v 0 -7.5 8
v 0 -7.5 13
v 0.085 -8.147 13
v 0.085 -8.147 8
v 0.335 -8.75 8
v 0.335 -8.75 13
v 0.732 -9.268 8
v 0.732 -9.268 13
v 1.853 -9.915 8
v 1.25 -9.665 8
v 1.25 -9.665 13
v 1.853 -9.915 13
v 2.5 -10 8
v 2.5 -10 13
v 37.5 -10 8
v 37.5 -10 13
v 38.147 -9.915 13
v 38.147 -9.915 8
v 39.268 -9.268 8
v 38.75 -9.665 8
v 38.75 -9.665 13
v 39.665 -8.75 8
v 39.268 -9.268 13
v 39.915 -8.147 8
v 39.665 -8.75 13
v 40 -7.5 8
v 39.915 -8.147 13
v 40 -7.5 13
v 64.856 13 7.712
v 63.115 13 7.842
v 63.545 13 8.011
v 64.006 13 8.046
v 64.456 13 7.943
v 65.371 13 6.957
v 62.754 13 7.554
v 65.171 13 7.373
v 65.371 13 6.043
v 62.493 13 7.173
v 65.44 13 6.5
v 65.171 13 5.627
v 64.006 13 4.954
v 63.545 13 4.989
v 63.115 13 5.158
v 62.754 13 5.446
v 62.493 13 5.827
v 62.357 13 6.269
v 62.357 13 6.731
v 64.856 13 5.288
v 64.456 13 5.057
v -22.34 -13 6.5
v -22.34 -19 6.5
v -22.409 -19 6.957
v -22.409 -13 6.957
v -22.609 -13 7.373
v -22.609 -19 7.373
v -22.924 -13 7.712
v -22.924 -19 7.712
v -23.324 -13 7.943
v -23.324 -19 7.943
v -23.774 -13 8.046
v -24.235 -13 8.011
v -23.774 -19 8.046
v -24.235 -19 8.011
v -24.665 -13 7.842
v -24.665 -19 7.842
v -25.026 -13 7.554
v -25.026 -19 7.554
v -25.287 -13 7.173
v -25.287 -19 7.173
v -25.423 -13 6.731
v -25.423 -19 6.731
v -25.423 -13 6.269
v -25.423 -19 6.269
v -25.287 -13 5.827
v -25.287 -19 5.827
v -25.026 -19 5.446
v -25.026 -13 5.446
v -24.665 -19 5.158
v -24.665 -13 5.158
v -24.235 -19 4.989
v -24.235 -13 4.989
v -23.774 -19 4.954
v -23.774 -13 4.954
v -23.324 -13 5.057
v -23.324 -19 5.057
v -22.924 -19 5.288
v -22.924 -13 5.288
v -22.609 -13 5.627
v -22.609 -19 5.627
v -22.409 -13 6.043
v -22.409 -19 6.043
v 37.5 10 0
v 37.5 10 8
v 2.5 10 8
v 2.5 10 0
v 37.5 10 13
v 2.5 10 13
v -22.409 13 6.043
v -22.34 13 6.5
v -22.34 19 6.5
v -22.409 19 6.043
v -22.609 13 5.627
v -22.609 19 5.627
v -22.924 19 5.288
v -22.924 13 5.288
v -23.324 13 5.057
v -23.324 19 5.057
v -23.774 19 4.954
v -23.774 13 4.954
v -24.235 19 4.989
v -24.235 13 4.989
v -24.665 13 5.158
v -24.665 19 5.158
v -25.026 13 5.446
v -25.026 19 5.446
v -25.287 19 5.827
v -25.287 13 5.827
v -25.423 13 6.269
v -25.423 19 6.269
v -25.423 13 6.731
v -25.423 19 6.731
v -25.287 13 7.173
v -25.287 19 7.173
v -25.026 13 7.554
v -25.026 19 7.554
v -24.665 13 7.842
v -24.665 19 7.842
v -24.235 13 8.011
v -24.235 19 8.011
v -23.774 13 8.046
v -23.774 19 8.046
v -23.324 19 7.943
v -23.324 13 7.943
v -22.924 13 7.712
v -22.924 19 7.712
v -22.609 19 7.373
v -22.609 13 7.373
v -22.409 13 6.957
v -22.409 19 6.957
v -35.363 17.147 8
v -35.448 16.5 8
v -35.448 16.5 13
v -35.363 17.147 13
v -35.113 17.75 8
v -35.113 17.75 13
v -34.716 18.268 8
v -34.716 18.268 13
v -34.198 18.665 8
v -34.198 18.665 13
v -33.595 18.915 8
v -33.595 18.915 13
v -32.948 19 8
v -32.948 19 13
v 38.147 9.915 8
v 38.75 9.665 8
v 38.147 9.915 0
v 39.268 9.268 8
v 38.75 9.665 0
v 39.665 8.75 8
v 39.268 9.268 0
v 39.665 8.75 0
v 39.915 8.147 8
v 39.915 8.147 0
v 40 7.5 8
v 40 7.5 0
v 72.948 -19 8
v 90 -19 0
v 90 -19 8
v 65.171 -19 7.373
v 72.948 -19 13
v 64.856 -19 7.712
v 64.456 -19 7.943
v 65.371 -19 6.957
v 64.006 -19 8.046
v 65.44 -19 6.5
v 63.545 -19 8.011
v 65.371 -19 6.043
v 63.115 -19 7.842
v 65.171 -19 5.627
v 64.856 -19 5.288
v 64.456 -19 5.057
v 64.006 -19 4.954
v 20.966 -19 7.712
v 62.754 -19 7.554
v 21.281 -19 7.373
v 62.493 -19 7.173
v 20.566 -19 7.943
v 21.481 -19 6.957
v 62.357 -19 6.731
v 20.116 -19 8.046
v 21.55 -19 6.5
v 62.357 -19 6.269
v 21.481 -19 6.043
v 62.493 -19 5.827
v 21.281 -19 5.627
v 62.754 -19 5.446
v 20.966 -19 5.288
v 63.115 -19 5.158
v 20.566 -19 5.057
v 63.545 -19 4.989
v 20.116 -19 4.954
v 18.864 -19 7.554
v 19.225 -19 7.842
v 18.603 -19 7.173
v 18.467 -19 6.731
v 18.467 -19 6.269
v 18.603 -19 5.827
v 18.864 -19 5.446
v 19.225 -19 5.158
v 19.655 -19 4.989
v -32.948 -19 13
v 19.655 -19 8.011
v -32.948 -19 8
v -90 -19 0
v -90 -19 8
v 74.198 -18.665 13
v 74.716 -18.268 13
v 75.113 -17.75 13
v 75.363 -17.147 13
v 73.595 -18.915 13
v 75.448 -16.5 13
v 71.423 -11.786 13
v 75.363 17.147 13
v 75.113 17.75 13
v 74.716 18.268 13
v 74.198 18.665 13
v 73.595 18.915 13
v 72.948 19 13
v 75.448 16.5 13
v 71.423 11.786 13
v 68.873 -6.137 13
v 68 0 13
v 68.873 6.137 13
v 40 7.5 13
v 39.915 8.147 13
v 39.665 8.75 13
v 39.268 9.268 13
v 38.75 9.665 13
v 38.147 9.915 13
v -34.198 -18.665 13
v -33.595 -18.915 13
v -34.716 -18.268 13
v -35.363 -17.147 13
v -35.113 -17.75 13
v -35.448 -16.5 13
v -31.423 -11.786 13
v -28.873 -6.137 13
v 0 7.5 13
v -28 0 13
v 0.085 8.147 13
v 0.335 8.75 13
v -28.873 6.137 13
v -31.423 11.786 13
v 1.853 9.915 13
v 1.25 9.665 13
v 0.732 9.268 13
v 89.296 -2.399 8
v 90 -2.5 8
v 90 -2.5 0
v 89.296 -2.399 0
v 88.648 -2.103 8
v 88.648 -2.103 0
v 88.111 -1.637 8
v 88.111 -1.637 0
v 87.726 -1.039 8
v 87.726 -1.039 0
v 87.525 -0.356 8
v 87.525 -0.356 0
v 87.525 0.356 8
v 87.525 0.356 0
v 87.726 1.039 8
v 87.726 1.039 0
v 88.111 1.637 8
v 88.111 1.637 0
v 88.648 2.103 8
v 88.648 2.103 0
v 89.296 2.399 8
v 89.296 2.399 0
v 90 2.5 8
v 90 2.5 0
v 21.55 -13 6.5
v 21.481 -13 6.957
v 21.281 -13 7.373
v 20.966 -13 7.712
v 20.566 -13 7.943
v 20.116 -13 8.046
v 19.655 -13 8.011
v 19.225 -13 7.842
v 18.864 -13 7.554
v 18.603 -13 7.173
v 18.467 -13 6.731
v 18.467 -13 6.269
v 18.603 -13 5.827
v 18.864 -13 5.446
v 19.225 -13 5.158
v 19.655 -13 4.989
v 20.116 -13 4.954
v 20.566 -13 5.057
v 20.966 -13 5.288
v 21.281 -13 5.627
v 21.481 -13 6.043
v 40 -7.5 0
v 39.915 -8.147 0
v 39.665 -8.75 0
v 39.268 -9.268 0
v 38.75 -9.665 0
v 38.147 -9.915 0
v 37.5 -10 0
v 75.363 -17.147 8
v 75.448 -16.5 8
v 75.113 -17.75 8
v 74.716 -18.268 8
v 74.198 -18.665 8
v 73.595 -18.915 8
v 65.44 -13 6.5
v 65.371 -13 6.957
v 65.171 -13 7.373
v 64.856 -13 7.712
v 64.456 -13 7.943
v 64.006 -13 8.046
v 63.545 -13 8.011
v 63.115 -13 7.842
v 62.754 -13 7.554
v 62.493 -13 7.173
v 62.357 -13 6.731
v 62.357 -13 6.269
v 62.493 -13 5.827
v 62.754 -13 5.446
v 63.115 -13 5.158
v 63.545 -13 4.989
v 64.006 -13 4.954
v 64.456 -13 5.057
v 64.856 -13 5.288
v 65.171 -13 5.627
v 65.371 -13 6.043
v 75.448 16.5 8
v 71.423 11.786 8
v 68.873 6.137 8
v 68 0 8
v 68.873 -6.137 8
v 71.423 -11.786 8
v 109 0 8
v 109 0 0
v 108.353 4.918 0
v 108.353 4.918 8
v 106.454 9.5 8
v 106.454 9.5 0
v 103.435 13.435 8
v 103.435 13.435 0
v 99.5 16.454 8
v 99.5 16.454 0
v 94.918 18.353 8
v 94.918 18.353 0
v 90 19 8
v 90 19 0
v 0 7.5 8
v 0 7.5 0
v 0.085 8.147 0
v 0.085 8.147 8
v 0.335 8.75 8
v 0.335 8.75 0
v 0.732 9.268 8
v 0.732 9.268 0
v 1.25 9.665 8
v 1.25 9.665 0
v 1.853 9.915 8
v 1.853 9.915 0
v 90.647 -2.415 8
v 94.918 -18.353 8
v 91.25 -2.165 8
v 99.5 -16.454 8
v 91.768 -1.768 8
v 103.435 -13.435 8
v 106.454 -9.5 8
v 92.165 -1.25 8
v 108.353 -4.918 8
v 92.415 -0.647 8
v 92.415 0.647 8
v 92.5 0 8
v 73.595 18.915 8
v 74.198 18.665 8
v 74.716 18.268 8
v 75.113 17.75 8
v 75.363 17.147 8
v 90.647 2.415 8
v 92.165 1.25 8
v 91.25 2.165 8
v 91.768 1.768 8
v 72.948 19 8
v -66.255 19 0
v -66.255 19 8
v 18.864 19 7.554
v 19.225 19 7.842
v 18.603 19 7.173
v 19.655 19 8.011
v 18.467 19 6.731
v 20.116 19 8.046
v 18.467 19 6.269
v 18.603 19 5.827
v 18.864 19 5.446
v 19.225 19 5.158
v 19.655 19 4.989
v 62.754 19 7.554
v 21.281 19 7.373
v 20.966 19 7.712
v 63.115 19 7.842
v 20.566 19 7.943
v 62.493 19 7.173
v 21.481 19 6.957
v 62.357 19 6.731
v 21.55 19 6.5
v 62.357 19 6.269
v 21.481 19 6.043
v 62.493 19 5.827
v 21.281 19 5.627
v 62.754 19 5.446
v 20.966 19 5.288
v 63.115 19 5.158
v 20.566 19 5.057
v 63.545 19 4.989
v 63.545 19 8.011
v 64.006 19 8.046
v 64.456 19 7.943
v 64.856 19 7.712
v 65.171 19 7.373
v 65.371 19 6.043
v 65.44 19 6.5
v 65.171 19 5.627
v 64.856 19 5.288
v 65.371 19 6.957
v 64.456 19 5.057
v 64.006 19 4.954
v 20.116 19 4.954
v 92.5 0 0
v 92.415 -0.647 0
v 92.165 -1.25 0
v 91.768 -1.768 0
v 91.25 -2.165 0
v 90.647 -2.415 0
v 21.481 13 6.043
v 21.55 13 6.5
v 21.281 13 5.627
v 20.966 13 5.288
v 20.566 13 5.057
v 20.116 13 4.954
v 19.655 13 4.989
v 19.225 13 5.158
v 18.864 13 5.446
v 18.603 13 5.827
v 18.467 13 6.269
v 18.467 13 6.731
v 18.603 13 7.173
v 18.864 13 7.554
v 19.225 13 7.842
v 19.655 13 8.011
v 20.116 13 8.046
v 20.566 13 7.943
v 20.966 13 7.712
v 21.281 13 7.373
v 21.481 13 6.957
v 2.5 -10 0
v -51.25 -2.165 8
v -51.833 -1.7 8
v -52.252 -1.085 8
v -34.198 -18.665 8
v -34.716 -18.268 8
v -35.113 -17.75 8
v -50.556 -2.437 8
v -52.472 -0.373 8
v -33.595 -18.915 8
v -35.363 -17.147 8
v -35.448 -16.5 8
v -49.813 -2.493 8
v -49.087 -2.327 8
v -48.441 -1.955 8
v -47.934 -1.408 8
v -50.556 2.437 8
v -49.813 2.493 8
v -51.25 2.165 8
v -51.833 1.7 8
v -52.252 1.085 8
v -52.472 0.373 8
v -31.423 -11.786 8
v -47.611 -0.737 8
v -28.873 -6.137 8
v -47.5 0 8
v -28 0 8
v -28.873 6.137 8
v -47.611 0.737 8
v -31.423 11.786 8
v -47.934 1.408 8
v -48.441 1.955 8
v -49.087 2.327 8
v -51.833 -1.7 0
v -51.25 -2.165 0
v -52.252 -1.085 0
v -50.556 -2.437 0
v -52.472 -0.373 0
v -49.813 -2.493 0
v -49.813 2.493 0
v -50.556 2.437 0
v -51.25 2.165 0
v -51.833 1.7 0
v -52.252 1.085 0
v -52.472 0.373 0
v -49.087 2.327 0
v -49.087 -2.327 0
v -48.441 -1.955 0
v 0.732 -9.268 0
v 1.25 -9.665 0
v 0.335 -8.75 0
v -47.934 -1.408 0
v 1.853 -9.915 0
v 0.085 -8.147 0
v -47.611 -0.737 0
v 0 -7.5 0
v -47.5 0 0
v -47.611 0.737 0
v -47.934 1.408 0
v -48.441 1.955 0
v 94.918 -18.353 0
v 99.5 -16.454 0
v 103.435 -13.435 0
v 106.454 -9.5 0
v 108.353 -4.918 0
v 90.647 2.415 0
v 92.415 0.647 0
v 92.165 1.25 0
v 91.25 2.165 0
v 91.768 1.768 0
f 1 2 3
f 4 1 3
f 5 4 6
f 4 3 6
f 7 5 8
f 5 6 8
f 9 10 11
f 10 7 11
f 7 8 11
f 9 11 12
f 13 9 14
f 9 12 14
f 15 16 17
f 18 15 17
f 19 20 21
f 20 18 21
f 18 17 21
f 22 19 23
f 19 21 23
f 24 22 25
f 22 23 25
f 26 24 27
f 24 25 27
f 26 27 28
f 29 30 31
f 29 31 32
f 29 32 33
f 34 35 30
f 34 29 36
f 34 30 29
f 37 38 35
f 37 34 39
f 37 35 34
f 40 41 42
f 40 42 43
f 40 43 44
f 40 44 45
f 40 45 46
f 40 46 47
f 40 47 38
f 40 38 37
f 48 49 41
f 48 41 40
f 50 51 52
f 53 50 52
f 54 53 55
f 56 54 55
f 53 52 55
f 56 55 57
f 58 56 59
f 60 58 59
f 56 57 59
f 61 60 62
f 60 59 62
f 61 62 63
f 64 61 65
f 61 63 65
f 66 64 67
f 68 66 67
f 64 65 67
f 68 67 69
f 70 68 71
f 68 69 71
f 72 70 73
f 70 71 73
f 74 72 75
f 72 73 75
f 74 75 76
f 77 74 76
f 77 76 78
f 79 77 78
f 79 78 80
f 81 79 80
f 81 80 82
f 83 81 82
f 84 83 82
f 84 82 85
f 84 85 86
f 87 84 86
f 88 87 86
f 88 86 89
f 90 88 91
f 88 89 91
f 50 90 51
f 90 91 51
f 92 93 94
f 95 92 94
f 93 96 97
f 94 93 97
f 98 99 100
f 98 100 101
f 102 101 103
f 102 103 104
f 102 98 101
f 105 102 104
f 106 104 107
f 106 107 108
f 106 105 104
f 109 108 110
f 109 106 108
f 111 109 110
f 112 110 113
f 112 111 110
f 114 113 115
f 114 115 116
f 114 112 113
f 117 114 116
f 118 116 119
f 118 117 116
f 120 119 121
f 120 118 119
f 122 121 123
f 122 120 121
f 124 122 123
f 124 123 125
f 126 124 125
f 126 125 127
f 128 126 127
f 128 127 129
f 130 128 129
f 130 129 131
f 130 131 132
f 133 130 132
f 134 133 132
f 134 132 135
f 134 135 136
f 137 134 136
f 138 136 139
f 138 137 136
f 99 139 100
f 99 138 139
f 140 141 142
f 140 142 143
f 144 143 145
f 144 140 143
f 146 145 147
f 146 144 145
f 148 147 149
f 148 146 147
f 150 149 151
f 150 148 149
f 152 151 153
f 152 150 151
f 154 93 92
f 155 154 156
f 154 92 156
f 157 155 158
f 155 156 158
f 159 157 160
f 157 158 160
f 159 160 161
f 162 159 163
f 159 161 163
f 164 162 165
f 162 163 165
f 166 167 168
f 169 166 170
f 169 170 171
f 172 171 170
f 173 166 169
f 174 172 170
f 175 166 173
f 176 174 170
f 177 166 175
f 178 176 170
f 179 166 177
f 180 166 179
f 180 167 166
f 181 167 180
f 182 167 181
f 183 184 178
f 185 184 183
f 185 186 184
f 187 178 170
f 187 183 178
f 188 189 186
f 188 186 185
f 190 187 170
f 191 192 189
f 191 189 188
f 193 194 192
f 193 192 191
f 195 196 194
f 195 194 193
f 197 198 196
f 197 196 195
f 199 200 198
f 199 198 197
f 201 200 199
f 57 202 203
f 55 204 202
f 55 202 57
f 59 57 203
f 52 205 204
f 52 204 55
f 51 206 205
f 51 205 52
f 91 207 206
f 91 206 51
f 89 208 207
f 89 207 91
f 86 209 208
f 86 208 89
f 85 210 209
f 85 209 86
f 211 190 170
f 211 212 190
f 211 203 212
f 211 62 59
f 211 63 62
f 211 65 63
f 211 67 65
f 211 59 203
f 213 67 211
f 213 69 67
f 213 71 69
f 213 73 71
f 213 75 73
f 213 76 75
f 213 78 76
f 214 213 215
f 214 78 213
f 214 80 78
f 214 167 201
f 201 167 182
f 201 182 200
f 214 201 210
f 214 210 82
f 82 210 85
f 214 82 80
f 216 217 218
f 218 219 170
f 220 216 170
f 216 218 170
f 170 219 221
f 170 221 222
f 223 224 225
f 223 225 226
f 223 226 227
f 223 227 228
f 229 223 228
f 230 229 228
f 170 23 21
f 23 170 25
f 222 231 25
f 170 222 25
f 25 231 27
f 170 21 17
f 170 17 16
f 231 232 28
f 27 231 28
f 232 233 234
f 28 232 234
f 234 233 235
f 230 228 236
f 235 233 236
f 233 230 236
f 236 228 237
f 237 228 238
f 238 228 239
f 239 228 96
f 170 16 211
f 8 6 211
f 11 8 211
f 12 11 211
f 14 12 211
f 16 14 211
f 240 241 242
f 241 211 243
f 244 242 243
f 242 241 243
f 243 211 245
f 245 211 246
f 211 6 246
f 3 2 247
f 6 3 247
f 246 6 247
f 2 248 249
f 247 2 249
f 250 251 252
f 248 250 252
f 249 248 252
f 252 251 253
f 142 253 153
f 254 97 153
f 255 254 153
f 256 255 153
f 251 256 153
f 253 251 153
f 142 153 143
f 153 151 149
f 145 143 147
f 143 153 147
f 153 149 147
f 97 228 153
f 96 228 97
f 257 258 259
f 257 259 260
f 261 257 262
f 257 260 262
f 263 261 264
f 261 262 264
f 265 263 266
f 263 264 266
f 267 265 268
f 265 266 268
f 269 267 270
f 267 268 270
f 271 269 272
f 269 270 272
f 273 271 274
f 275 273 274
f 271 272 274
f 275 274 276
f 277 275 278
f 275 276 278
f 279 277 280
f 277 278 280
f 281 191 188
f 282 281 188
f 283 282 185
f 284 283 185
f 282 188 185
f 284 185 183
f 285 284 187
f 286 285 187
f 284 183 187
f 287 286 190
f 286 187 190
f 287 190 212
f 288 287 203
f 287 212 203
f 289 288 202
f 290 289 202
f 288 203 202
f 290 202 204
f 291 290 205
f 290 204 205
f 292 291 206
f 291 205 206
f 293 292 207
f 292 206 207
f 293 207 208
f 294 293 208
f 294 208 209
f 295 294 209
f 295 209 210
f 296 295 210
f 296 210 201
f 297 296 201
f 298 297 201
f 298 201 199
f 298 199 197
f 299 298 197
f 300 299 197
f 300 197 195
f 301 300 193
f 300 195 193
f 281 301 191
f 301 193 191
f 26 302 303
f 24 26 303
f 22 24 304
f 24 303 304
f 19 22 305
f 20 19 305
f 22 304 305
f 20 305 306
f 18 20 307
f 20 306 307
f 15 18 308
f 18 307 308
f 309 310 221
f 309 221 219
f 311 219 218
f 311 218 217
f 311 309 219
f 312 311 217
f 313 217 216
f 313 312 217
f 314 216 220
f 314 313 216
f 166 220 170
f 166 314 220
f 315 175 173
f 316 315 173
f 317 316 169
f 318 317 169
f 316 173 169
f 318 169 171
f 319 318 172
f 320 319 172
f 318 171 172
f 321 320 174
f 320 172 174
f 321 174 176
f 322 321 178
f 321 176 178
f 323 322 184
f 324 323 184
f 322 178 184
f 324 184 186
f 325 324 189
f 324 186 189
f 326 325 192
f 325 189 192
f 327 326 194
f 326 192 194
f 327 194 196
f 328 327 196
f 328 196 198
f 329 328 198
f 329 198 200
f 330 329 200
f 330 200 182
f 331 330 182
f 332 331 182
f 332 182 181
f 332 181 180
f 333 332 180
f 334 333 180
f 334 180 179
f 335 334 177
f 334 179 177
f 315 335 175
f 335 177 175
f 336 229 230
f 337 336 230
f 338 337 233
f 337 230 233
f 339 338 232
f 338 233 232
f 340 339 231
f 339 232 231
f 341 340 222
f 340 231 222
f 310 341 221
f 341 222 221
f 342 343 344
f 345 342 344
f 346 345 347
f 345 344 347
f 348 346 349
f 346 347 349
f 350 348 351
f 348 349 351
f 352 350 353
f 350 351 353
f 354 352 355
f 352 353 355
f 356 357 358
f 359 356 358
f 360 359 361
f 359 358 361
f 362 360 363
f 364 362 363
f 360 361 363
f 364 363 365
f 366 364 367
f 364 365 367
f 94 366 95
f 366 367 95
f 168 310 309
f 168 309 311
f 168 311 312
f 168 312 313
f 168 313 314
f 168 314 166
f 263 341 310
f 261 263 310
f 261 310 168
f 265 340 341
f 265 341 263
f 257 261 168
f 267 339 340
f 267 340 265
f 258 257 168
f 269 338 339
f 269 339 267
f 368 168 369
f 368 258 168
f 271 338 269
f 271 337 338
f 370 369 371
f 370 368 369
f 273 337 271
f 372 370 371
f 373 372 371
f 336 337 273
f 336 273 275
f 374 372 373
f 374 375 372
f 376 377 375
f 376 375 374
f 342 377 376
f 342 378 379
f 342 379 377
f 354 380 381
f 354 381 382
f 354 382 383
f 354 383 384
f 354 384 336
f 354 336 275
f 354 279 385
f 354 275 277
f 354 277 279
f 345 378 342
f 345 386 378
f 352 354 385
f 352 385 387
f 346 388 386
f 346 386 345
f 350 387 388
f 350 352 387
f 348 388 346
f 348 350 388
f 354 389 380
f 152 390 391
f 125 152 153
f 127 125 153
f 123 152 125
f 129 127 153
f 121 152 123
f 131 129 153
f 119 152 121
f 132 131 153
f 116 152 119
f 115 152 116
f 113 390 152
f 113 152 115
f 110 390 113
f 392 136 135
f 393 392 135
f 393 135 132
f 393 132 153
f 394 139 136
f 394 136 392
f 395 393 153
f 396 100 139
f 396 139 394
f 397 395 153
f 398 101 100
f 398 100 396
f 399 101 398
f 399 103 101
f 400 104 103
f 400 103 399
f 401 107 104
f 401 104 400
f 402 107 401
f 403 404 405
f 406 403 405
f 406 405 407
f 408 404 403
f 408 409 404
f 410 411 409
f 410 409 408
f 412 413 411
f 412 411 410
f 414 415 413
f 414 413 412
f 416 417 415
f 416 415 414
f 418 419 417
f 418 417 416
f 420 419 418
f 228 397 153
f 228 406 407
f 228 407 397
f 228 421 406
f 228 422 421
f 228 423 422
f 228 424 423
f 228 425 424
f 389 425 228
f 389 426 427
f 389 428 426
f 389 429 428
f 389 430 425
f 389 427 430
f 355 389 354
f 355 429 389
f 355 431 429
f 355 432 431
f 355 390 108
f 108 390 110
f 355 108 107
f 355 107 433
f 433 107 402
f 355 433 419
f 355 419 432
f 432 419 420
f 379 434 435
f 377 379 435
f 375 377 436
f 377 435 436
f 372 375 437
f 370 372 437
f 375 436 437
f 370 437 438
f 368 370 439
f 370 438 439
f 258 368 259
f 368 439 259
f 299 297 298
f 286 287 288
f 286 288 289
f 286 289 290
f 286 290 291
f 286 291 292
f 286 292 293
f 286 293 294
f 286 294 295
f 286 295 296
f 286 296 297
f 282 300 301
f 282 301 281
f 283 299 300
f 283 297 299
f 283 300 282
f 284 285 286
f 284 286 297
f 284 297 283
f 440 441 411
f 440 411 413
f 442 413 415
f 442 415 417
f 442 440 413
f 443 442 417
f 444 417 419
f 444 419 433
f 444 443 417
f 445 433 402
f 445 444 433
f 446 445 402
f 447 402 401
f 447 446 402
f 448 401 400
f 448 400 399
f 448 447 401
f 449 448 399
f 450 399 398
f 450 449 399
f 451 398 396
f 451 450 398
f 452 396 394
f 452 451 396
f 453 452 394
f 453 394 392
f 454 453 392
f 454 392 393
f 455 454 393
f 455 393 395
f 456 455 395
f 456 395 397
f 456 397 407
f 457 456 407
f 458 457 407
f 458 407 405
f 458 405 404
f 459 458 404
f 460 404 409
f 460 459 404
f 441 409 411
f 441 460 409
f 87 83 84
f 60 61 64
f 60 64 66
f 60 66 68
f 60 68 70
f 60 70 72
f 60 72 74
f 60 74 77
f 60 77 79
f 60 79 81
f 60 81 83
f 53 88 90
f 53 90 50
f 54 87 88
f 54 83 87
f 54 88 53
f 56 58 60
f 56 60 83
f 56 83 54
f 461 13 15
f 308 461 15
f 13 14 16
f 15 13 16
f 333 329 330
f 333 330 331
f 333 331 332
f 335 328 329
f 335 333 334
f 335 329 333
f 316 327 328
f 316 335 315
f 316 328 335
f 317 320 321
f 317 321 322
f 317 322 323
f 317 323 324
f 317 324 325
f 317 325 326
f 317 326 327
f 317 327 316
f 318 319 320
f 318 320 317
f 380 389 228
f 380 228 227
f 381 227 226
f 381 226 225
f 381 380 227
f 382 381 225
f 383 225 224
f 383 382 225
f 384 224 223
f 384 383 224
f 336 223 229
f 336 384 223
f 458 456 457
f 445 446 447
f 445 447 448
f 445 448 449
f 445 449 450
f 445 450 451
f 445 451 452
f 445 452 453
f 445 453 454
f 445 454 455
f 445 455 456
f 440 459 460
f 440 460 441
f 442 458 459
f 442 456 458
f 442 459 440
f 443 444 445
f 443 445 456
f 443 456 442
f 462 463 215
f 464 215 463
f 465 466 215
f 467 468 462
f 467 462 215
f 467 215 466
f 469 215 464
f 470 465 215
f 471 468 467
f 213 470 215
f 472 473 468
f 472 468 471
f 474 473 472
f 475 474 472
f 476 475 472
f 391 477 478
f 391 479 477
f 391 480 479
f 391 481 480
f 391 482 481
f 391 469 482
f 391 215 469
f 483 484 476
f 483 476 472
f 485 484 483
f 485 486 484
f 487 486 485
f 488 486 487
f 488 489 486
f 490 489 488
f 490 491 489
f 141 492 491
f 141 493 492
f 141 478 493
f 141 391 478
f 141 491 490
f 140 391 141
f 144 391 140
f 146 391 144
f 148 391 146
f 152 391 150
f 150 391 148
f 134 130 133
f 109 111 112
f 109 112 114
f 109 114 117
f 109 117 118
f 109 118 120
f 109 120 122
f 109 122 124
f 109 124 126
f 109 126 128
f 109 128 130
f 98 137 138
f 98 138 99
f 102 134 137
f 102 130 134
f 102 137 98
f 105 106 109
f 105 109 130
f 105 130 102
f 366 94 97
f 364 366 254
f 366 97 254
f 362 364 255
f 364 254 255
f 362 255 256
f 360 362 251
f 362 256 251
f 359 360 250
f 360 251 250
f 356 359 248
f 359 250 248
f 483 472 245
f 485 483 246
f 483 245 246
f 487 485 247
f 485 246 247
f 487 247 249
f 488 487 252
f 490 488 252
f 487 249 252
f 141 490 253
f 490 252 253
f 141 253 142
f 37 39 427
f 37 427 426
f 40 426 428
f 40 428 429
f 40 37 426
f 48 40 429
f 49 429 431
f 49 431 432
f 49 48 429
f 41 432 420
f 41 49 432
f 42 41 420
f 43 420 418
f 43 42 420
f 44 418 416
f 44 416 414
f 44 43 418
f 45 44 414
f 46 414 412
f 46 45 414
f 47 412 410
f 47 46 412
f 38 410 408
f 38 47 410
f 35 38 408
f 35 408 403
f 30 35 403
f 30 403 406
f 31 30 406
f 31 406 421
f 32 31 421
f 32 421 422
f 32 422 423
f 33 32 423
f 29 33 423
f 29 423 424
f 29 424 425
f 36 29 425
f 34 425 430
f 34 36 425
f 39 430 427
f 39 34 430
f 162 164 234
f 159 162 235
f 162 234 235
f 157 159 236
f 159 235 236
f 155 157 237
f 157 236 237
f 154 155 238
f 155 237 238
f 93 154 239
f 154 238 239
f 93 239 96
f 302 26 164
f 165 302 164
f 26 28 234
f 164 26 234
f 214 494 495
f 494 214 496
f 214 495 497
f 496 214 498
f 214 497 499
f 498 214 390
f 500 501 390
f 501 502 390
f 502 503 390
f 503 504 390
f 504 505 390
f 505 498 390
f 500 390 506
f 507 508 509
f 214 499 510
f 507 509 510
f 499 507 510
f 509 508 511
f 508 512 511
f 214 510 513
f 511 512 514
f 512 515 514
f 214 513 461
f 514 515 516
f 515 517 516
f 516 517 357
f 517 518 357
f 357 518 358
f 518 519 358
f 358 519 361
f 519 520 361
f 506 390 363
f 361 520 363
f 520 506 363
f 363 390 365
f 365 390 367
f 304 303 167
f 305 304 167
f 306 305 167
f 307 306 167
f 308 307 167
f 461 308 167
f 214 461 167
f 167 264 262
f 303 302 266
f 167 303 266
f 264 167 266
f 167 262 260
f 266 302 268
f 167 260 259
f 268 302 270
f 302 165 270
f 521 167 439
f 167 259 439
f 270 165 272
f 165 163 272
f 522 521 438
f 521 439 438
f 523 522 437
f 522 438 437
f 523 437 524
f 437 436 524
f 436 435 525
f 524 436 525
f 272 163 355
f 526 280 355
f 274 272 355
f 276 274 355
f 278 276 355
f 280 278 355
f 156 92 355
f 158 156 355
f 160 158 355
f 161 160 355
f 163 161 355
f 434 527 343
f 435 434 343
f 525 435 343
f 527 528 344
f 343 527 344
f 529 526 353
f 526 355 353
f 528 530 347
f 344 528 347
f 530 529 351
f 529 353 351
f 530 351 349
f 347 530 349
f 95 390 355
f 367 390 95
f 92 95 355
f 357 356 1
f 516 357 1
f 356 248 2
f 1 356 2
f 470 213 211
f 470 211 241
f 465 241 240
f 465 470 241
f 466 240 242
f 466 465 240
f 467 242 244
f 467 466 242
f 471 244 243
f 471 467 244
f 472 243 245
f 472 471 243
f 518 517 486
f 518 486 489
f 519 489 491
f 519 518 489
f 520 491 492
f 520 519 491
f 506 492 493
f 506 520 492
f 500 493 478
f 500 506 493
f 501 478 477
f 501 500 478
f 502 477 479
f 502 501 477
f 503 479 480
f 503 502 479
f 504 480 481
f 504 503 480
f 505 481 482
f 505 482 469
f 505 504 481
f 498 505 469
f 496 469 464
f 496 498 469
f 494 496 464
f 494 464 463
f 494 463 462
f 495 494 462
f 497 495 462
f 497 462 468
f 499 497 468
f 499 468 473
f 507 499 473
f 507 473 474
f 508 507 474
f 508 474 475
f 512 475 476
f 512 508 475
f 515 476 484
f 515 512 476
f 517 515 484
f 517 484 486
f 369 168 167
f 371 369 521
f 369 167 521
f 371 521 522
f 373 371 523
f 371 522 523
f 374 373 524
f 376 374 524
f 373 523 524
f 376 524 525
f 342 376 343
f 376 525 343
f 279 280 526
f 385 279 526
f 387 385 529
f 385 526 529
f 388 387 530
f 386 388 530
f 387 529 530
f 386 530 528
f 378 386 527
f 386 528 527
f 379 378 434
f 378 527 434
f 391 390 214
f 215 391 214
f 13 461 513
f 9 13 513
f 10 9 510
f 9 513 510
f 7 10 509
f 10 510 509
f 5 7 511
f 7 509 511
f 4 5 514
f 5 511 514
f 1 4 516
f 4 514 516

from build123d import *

# Parameters (mm, degrees)
SKETCH1_R           = 2.5
BOSS_EXTRUDE3_DEPTH = 8
BOSS_EXTRUDE7_DEPTH = 5
CUT_EXTRUDE1_DEPTH  = 112.404667766
SKETCH18_R          = 1.55
CUT_EXTRUDE2_DEPTH  = 6
CUT_EXTRUDE3_START  = -6
SKETCH19_R          = 1.55
CUT_EXTRUDE3_DEPTH  = 6
SKETCH21_R          = 22
CUT_EXTRUDE5_DEPTH  = 5


with BuildPart() as part:
    # Sketch1 → Boss-Extrude3 (new body)
    # profile 1 of 5: a face of its own
    with BuildSketch(Plane.XY):
        with BuildLine():
            Line((-66.254964627, 19), (-90, -19))
            Line((-90, -19), (90, -19))
            ThreePointArc((90, -19), (71, 0), (90, 19))
            Line((90, 19), (-66.254964627, 19))
        make_face()
        with Locations((-50, 0)):
            Circle(SKETCH1_R, mode=Mode.SUBTRACT)
        with BuildLine():
            ThreePointArc((40, -7.5), (39.267766953, -9.267766953), (37.5, -10))
            Line((37.5, -10), (2.5, -10))
            ThreePointArc((2.5, -10), (0.732233047, -9.267766953), (0, -7.5))
            Line((0, -7.5), (0, 7.5))
            ThreePointArc((0, 7.5), (0.732233047, 9.267766953), (2.5, 10))
            Line((2.5, 10), (37.5, 10))
            ThreePointArc((37.5, 10), (39.267766953, 9.267766953), (40, 7.5))
            Line((40, 7.5), (40, -7.5))
        make_face(mode=Mode.SUBTRACT)
    # profile 2 of 5: a face of its own
    with BuildSketch(Plane.XY):
        with BuildLine():
            ThreePointArc((90, 19), (71, 0), (90, -19))
            Line((90, -19), (90, -2.5))
            ThreePointArc((90, -2.5), (87.5, 0), (90, 2.5))
            Line((90, 2.5), (90, 19))
        make_face()
    # profile 3 of 5: a face of its own
    with BuildSketch(Plane.XY):
        with BuildLine():
            Line((90, -2.5), (90, -19))
            ThreePointArc((90, -19), (103.435028843, -13.435028843), (109, 0))
            ThreePointArc((109, 0), (103.435028843, 13.435028843), (90, 19))
            Line((90, 19), (90, 2.5))
            ThreePointArc((90, 2.5), (91.767766953, 1.767766953), (92.5, 0))
            ThreePointArc((92.5, 0), (91.767766953, -1.767766953), (90, -2.5))
        make_face()
    # profile 4 of 5: a face of its own
    with BuildSketch(Plane.XY):
        with BuildLine():
            ThreePointArc((90, 19), (71, 0), (90, -19))
            Line((90, -19), (90, -2.5))
            ThreePointArc((90, -2.5), (87.5, 0), (90, 2.5))
            Line((90, 2.5), (90, 19))
        make_face()
    # profile 5 of 5: a face of its own
    with BuildSketch(Plane.XY):
        with BuildLine():
            Line((90, -2.5), (90, -19))
            ThreePointArc((90, -19), (103.435028843, -13.435028843), (109, 0))
            ThreePointArc((109, 0), (103.435028843, 13.435028843), (90, 19))
            Line((90, 19), (90, 2.5))
            ThreePointArc((90, 2.5), (91.767766953, 1.767766953), (92.5, 0))
            ThreePointArc((92.5, 0), (91.767766953, -1.767766953), (90, -2.5))
        make_face()
    extrude(amount=BOSS_EXTRUDE3_DEPTH)

    # Sketch3 → Boss-Extrude7 (add)
    with BuildSketch(Plane.XY.offset(8)):
        with BuildLine():
            Line((-32.948367789, 19), (72.948367789, 19))
            ThreePointArc((72.948367789, 19), (74.716134742, 18.267766953), (75.448367789, 16.5))
            Line((75.448367789, 16.5), (75.448367789, -16.5))
            ThreePointArc((75.448367789, -16.5), (74.716134742, -18.267766953), (72.948367789, -19))
            Line((72.948367789, -19), (-32.948367789, -19))
            ThreePointArc((-32.948367789, -19), (-34.716134742, -18.267766953), (-35.448367789, -16.5))
            Line((-35.448367789, -16.5), (-35.448367789, 16.5))
            ThreePointArc((-35.448367789, 16.5), (-34.716134742, 18.267766953), (-32.948367789, 19))
        make_face()
    extrude(amount=BOSS_EXTRUDE7_DEPTH)

    # Sketch14 → Cut-Extrude1 (cut, through all)
    with BuildSketch(Plane.XY.offset(13)):
        with BuildLine():
            Line((2.5, -10), (37.5, -10))
            ThreePointArc((37.5, -10), (39.267766953, -9.267766953), (40, -7.5))
            Line((40, -7.5), (40, 7.5))
            ThreePointArc((40, 7.5), (39.267766953, 9.267766953), (37.5, 10))
            Line((37.5, 10), (2.5, 10))
            ThreePointArc((2.5, 10), (0.732233047, 9.267766953), (0, 7.5))
            Line((0, 7.5), (0, -7.5))
            ThreePointArc((0, -7.5), (0.732233047, -9.267766953), (2.5, -10))
        make_face()
    extrude(amount=-CUT_EXTRUDE1_DEPTH, mode=Mode.SUBTRACT)

    # Sketch18 → Cut-Extrude2 (cut)
    with BuildSketch(Plane.XZ.offset(19)):
        with Locations((-23.89, 6.5)):
            Circle(SKETCH18_R)
        with Locations((20, 6.5)):
            Circle(SKETCH18_R)
        with Locations((63.89, 6.5)):
            Circle(SKETCH18_R)
    extrude(amount=-CUT_EXTRUDE2_DEPTH, mode=Mode.SUBTRACT)

    # Sketch19 → Cut-Extrude3 (cut)
    with BuildSketch(Plane(origin=(0, 19, 0), x_dir=(1, 0, 0), z_dir=(0, 1, 0)).offset(CUT_EXTRUDE3_START)):
        with Locations((-23.89, -6.5)):
            Circle(SKETCH19_R)
        with Locations((20, -6.5)):
            Circle(SKETCH19_R)
        with Locations((63.89, -6.5)):
            Circle(SKETCH19_R)
    extrude(amount=CUT_EXTRUDE3_DEPTH, mode=Mode.SUBTRACT)

    # Sketch21 → Cut-Extrude5 (cut)
    with BuildSketch(Plane.XY.offset(13)):
        with Locations((-50, 0)):
            Circle(SKETCH21_R)
        with Locations((90, 0)):
            Circle(SKETCH21_R)
    extrude(amount=-CUT_EXTRUDE5_DEPTH, mode=Mode.SUBTRACT)


solid = part.part
